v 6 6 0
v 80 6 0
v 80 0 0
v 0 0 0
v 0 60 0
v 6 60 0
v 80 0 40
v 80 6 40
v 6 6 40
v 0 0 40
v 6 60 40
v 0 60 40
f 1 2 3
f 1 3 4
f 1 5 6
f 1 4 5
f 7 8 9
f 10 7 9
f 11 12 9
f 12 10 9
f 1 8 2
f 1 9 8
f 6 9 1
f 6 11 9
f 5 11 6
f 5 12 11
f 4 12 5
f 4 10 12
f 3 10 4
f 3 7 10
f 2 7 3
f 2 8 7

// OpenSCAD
$fn = 32;

// ----------------------------------------------------------------------
// Structural section: angle 80 x 60 mm
// ----------------------------------------------------------------------

// --- parameters (mm) ---
sec_w = 80;               // leg width, X
sec_h = 60;               // leg height, Y
flange_t = 6;             // leg thickness
plate_t = 40;             // cut length, Z (extrusion height)

profile = [[0, 0], [80, 0], [80, 6], [6, 6], [6, 60], [0, 60]];  // primary outline, 6 points, counter clockwise

// --- the one profile operation ---
linear_extrude(height = plate_t) polygon(points = profile);
